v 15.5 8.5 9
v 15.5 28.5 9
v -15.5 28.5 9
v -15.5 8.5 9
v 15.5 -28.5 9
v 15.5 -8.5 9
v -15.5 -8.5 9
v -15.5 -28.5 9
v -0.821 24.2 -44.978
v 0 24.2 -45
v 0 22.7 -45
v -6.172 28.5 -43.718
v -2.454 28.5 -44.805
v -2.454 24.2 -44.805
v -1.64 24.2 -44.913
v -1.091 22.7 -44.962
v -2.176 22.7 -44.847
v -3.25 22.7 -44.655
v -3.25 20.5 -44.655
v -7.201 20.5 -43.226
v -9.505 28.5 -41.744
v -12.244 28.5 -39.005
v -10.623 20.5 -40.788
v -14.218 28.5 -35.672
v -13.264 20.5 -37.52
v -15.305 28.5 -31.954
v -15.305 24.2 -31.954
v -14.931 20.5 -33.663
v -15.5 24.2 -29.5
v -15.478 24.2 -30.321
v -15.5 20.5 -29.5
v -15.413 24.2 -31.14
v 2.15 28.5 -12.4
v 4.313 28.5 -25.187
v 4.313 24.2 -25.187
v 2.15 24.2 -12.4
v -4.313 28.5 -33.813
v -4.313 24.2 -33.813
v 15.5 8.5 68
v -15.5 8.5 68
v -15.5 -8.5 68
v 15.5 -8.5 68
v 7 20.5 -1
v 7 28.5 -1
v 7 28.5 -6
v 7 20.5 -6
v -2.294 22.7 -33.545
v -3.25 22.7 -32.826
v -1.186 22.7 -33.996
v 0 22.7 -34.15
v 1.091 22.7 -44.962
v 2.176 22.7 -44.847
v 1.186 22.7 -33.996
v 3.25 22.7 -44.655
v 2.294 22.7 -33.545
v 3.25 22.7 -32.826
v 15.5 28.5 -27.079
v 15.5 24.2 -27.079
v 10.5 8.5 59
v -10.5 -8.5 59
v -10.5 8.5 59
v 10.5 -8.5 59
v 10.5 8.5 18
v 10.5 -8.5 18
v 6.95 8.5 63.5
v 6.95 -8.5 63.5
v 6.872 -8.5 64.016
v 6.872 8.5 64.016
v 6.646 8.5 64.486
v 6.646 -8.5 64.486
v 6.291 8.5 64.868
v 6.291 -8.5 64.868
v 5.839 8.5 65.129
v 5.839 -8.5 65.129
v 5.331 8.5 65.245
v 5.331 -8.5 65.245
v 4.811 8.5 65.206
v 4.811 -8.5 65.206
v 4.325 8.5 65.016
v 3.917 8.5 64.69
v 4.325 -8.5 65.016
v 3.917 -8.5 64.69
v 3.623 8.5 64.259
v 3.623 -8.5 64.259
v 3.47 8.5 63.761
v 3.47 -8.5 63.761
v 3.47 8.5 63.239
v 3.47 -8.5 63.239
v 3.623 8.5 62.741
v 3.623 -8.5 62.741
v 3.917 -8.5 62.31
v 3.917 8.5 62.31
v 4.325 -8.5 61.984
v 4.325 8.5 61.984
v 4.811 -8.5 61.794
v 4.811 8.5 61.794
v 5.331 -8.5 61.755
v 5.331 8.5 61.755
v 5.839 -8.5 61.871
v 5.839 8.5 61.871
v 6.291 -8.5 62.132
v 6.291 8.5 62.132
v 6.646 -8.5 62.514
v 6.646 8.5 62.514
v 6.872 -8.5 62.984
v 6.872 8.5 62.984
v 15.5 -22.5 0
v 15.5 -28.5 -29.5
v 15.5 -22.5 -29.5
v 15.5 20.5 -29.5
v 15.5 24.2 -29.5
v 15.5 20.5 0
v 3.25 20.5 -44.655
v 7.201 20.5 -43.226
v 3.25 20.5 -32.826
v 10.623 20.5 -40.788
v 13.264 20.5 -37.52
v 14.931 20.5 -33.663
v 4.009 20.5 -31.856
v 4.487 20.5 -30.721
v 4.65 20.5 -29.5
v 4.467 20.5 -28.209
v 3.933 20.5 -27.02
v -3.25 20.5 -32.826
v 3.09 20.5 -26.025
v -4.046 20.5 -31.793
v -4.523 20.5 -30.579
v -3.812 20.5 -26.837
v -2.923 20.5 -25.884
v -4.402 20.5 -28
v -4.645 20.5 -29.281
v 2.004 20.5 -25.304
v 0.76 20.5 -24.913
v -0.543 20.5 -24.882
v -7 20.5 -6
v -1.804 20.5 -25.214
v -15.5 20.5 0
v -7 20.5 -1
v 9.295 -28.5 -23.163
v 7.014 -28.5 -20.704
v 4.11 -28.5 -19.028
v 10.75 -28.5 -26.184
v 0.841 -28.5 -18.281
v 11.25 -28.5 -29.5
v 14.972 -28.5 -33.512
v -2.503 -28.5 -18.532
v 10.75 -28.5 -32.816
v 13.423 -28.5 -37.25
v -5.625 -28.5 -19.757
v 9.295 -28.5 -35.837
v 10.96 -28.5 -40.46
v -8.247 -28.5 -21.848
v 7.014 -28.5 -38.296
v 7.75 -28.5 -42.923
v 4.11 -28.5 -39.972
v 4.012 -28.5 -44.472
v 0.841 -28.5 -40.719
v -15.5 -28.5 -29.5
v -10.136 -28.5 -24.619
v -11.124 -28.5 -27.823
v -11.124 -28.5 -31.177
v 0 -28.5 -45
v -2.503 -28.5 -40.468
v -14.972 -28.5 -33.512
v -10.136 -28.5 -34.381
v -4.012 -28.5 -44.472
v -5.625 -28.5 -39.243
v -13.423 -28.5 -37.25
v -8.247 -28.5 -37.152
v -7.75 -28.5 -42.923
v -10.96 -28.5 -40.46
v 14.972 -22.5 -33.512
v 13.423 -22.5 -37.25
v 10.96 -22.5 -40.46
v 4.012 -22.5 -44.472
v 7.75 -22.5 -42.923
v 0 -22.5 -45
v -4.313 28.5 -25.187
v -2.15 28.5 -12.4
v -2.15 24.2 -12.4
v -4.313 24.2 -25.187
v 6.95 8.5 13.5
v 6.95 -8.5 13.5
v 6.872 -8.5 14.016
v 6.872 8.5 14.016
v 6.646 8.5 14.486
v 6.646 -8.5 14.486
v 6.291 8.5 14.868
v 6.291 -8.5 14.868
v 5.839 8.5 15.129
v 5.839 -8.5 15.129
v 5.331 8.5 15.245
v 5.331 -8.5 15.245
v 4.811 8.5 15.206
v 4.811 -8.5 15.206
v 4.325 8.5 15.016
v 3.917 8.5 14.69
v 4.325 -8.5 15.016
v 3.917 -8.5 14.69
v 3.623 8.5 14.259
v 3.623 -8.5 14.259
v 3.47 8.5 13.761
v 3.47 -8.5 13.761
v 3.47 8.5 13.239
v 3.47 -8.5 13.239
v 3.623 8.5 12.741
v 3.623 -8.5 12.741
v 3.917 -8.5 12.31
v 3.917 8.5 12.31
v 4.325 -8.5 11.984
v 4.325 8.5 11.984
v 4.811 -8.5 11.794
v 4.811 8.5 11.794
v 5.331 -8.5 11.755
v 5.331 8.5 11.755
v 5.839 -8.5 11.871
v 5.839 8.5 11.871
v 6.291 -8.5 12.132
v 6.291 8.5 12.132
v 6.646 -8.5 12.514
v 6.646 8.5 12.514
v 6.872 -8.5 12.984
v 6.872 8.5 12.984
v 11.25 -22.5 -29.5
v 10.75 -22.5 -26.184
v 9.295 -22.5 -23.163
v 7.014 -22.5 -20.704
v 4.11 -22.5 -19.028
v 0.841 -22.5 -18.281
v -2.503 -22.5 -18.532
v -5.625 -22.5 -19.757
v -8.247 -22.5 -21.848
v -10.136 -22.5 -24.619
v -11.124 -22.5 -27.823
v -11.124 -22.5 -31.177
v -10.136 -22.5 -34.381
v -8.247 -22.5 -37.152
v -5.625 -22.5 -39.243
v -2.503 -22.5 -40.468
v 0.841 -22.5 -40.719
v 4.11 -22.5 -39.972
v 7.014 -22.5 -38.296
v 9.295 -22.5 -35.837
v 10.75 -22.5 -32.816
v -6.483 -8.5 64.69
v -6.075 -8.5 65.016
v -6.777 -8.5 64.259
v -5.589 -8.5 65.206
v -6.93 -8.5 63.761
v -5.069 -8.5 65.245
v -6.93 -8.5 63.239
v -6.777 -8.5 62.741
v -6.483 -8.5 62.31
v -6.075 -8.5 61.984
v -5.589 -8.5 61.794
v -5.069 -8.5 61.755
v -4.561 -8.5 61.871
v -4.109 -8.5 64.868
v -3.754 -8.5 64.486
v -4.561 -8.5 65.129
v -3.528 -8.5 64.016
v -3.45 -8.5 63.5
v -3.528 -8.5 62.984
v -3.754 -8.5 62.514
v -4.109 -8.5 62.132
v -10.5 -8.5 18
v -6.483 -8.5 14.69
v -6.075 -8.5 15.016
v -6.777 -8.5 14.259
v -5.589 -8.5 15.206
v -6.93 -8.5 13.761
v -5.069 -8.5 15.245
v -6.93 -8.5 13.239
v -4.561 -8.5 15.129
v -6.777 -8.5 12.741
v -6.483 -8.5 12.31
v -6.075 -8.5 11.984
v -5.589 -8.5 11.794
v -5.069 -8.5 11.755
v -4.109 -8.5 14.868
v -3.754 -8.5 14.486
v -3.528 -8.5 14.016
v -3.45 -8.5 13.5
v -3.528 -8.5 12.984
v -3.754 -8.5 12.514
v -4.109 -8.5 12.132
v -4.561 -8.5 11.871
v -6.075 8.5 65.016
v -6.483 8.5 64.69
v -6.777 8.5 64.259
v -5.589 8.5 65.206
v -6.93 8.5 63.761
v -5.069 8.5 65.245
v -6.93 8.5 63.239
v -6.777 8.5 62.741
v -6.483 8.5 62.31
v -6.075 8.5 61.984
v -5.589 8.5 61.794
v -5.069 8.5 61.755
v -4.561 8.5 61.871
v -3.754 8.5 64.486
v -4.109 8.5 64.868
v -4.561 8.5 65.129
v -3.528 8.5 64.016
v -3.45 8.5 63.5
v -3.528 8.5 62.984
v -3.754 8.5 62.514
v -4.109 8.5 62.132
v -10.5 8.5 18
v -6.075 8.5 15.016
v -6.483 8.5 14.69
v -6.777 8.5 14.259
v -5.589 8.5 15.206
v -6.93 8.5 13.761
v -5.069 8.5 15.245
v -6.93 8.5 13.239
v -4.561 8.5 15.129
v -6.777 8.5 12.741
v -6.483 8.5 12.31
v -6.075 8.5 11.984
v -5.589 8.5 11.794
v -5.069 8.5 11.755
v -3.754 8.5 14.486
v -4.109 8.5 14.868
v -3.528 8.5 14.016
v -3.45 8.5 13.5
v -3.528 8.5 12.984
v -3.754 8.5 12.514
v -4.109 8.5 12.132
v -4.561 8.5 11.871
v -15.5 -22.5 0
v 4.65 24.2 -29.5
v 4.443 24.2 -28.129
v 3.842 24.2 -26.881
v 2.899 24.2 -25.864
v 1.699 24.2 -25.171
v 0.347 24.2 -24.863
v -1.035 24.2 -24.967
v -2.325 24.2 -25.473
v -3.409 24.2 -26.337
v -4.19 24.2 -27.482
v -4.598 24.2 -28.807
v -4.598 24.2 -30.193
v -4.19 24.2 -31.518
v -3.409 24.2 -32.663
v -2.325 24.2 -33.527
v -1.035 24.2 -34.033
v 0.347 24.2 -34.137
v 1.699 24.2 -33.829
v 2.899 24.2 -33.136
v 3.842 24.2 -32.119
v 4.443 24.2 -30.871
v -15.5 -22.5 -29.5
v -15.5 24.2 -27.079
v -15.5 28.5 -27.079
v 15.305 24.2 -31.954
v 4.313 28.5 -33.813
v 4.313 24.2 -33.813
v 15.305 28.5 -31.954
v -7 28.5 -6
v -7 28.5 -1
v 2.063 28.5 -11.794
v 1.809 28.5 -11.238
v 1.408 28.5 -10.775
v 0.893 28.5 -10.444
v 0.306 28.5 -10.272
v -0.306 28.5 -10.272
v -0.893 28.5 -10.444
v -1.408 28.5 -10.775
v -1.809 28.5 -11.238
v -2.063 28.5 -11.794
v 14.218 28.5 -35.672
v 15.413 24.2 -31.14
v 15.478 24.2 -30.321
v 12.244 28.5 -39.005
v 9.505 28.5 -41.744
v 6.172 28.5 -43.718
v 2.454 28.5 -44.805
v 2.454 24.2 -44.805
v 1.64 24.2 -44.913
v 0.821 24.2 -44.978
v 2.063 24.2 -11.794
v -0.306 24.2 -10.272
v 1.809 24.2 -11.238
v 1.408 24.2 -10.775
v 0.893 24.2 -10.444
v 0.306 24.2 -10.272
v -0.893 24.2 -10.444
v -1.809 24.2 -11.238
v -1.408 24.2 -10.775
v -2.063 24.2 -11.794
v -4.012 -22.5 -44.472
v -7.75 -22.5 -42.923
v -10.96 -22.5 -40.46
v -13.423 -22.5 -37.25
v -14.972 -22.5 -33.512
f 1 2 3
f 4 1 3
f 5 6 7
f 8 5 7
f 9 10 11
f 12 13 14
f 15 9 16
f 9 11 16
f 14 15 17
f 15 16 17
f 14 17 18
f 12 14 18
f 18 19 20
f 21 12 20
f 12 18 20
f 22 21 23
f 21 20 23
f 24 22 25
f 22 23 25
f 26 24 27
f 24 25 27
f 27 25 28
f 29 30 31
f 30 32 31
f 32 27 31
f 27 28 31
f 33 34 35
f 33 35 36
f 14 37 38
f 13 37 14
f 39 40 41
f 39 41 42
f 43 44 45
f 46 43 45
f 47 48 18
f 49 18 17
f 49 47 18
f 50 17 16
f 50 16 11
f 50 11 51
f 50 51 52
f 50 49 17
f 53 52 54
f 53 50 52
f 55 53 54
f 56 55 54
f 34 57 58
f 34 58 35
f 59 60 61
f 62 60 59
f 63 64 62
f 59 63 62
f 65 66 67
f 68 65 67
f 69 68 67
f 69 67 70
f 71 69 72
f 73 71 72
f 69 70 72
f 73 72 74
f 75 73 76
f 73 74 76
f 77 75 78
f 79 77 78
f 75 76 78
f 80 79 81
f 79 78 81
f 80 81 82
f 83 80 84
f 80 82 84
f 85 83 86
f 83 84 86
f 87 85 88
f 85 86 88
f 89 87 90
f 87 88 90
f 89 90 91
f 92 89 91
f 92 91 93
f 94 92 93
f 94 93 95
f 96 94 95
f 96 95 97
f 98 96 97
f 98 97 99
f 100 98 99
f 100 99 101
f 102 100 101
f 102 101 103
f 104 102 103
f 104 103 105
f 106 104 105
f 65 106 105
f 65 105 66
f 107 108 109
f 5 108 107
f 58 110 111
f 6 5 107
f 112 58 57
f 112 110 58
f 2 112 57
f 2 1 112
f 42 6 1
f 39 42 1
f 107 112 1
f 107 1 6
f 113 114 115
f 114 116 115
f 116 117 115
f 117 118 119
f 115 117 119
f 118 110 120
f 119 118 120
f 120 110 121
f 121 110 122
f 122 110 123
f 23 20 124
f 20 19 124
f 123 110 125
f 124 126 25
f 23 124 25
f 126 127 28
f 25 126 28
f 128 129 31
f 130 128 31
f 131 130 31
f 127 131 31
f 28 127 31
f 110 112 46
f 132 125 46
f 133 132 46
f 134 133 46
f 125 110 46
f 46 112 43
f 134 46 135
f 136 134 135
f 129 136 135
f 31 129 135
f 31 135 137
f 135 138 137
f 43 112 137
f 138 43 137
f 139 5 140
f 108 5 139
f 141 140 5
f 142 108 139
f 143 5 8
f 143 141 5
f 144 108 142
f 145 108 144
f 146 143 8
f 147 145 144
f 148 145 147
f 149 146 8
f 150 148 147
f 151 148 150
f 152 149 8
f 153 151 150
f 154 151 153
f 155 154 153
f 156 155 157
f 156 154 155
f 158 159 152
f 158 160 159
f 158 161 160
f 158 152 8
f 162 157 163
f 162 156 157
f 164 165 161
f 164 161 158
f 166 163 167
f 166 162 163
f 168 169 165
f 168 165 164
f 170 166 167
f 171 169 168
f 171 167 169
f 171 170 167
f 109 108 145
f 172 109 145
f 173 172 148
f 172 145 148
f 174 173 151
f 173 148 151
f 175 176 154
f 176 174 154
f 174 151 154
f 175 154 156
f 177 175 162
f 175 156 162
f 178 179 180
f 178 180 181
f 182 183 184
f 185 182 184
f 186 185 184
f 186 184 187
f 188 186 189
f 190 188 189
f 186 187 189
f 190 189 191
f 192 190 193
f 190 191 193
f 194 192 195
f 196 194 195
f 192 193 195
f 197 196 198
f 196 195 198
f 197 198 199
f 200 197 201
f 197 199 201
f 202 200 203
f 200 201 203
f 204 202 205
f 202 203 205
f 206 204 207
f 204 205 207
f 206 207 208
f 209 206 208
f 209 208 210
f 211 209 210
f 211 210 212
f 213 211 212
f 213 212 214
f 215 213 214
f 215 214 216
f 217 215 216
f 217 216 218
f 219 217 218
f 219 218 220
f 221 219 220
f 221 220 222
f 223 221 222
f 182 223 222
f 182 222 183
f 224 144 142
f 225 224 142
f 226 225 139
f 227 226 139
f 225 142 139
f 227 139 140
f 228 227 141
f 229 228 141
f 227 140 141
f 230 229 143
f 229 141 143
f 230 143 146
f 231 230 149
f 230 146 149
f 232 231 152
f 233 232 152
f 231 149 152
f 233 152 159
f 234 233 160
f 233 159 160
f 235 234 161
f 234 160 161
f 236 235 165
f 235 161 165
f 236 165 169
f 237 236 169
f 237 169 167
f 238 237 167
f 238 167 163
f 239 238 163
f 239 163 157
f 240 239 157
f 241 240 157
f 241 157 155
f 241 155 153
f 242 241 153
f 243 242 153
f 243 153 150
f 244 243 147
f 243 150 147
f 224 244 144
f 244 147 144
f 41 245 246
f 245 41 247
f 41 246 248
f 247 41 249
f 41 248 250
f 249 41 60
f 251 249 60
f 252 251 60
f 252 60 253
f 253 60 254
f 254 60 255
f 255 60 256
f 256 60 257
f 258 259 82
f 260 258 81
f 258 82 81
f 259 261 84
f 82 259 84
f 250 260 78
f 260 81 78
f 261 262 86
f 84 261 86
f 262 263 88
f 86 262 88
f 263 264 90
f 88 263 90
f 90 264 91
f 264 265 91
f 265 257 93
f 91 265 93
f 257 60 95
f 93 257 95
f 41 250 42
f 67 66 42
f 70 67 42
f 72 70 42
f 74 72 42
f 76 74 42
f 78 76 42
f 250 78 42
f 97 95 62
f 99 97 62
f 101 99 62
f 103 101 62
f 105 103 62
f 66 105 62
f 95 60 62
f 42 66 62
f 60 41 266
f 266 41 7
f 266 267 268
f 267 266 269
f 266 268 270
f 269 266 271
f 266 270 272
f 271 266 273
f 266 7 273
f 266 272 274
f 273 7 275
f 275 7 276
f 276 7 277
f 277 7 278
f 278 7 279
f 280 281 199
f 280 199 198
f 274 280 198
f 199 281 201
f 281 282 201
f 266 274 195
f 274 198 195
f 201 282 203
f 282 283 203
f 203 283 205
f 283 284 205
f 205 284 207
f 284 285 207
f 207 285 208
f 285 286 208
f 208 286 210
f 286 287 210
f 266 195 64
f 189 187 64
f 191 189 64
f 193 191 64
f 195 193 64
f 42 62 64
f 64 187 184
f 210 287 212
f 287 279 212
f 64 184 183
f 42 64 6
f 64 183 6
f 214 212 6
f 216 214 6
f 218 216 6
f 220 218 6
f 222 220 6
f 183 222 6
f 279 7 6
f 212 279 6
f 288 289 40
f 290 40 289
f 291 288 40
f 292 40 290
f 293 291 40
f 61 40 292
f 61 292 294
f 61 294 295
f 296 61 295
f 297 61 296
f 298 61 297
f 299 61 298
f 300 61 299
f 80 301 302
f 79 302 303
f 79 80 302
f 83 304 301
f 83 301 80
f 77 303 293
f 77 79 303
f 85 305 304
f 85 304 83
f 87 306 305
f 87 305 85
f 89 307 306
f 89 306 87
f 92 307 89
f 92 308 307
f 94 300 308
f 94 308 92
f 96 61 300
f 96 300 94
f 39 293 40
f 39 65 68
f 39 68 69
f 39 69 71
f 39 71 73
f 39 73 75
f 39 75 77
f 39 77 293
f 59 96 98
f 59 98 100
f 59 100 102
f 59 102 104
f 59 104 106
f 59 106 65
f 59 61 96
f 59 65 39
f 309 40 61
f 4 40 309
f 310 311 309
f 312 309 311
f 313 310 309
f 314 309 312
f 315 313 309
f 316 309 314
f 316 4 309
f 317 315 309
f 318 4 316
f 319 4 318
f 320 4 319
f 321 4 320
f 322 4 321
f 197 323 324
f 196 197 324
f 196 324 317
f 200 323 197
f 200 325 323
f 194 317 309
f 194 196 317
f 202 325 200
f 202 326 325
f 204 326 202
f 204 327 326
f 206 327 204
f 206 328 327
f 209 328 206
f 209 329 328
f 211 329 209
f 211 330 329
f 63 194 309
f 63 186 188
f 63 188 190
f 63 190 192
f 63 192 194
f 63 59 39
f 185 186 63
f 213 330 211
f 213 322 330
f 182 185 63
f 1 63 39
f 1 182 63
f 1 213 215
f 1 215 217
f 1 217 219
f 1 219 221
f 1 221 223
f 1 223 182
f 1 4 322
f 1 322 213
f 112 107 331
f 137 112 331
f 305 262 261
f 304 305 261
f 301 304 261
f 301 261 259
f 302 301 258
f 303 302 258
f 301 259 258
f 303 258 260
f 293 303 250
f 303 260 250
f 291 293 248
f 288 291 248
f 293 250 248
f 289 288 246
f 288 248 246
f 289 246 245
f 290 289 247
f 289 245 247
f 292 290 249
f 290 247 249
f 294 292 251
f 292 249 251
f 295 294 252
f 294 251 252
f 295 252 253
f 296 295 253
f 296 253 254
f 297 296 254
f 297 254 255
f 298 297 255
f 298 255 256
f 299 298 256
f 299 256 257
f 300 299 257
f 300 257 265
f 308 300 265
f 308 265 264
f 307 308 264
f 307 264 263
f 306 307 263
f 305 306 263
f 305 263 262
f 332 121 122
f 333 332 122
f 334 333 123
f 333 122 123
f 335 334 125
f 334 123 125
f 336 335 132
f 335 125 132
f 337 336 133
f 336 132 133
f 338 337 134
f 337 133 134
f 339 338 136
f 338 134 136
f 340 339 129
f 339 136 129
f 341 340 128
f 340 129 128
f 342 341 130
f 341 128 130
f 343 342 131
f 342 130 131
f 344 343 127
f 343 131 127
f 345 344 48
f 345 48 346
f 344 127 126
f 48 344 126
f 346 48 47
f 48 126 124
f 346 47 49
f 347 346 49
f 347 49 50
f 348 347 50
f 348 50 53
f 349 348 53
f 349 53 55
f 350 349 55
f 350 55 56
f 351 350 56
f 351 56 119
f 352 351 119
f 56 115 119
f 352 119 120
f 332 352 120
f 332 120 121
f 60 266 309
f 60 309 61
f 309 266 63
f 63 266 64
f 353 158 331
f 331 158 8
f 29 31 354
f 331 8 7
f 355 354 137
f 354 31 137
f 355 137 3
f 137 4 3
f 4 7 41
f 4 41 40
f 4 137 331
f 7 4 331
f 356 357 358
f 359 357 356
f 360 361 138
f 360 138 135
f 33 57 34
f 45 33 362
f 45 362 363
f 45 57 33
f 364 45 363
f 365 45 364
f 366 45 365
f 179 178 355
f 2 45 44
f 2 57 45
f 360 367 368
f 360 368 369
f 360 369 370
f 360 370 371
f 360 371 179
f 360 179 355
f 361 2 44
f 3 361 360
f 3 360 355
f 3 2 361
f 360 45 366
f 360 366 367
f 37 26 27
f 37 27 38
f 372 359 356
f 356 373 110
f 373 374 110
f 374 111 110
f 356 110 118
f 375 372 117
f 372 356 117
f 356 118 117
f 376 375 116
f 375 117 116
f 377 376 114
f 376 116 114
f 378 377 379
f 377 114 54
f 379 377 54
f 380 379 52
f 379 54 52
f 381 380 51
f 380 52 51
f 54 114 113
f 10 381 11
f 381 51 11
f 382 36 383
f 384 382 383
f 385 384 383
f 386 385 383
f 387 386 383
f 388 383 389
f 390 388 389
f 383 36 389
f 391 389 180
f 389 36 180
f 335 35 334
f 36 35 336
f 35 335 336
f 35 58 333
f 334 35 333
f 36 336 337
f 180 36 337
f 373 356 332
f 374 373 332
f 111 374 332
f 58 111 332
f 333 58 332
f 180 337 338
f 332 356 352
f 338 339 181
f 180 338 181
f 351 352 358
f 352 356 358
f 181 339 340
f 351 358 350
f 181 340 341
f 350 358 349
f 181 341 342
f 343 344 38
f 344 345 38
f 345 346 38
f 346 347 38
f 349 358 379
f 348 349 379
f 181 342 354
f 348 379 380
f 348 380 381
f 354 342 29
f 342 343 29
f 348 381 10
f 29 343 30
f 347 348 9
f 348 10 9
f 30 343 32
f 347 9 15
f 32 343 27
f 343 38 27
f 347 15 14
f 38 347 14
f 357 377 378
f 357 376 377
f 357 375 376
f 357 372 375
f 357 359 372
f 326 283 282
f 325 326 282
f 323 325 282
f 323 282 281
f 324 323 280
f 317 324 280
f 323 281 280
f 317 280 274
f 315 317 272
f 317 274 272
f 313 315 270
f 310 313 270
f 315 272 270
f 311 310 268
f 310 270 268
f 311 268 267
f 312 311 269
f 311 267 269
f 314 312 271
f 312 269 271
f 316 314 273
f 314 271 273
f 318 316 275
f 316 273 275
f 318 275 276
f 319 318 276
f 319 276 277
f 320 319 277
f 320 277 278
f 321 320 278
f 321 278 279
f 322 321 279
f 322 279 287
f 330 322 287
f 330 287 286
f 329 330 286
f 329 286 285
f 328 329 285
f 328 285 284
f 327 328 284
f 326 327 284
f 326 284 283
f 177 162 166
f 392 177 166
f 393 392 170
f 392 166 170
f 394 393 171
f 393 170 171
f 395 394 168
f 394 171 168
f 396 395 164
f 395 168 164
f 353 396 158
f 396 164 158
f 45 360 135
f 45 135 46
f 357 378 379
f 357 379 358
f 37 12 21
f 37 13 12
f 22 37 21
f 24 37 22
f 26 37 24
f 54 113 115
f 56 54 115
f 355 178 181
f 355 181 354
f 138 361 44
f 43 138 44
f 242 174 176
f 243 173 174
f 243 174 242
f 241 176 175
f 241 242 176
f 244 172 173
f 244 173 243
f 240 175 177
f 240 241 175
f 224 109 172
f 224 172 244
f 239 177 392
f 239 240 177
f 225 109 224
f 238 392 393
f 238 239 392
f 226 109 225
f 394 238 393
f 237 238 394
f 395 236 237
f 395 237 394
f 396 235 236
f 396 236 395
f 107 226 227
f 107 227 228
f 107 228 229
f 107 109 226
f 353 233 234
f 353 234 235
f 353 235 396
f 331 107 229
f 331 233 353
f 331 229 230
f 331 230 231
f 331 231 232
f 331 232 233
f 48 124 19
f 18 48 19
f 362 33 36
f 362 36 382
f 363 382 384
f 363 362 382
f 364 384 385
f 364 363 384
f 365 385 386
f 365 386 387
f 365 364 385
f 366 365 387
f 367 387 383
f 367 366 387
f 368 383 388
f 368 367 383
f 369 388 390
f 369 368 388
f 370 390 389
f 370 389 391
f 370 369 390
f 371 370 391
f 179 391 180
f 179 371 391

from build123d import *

# Parameters (mm, degrees)
BOSS_EXTRUDE1_DEPTH = 9
SKETCH4_W           = 31
SKETCH4_H           = 8
SKETCH4_H_2         = 6
BOSS_EXTRUDE4_DEPTH = 45
CUT_EXTRUDE1_DEPTH  = 58
SKETCH6_3_R         = 11.25
CUT_EXTRUDE2_DEPTH  = 6
CUT_EXTRUDE3_DEPTH  = 4.3
CUT_EXTRUDE4_DEPTH  = 2.2
SKETCH9_3_R         = 4.65
CUT_EXTRUDE5_DEPTH  = 8
SKETCH10_W          = 31
SKETCH10_H          = 17
BOSS_EXTRUDE5_DEPTH = 59
SKETCH11_R          = 1.75
SKETCH11_W          = 21
SKETCH11_H          = 41
CUT_EXTRUDE6_DEPTH  = 38
SKETCH13_W          = 14
SKETCH13_H          = 5
CUT_EXTRUDE8_DEPTH  = 9


with BuildPart() as part:
    # Sketch1 → Boss-Extrude1 (new body)
    with BuildSketch(Plane.XY):
        Polygon((15.5, -28.5), (-15.5, -28.5), (-15.5, -10.3), (-15.5, 10.3), (-15.5, 28.5), (15.5, 28.5), align=None)
    extrude(amount=BOSS_EXTRUDE1_DEPTH)

    # Sketch4 → Boss-Extrude4 (add)
    with BuildSketch(Plane(origin=(0, 0, 0), x_dir=(-1, 0, 0), z_dir=(0, 0, -1))):
        with Locations((0, 24.5)):
            Rectangle(SKETCH4_W, SKETCH4_H)
        with Locations((0, -25.5)):
            Rectangle(SKETCH4_W, SKETCH4_H_2)
    extrude(amount=BOSS_EXTRUDE4_DEPTH)

    # Sketch6 → Cut-Extrude1 (cut, through all)
    with BuildSketch(Plane.XZ.offset(28.5)):
        with BuildLine():
            ThreePointArc((15.5, -29.5), (10.960155101, -40.460155116), (-2.1e-08, -45))
            Line((-2.1e-08, -45), (15.5, -45))
            Line((15.5, -45), (15.5, -29.5))
        make_face()
        with BuildLine():
            ThreePointArc((-2.1e-08, -45), (-10.960155116, -40.460155101), (-15.5, -29.5))
            Line((-15.5, -29.5), (-15.5, -45))
            Line((-15.5, -45), (-2.1e-08, -45))
        make_face()
    extrude(amount=-CUT_EXTRUDE1_DEPTH, mode=Mode.SUBTRACT)

    # Sketch6<3> → Cut-Extrude2 (cut)
    with BuildSketch(Plane.XZ.offset(28.5)):
        with Locations((0, -29.5)):
            Circle(SKETCH6_3_R)
    extrude(amount=-CUT_EXTRUDE2_DEPTH, mode=Mode.SUBTRACT)

    # Sketch7 → Cut-Extrude3 (cut)
    with BuildSketch(Plane(origin=(0, 28.5, 0), x_dir=(1, 0, 0), z_dir=(0, 1, 0))):
        with BuildLine():
            Line((-17.1, 31.65), (-4.313351365, 33.813351365))
            Line((-4.313351365, 33.813351365), (-2.15, 46.6))
            ThreePointArc((-2.15, 46.6), (0, 48.75), (2.15, 46.6))
            Line((2.15, 46.6), (4.313351365, 33.813351365))
            Line((4.313351365, 33.813351365), (17.1, 31.65))
            ThreePointArc((17.1, 31.65), (19.25, 29.5), (17.1, 27.35))
            Line((17.1, 27.35), (4.313351365, 25.186648635))
            Line((4.313351365, 25.186648635), (2.15, 12.4))
            ThreePointArc((2.15, 12.4), (0, 10.25), (-2.15, 12.4))
            Line((-2.15, 12.4), (-4.313351365, 25.186648635))
            Line((-4.313351365, 25.186648635), (-17.1, 27.35))
            ThreePointArc((-17.1, 27.35), (-19.25, 29.5), (-17.1, 31.65))
        make_face()
    extrude(amount=-CUT_EXTRUDE3_DEPTH, mode=Mode.SUBTRACT)

    # Sketch9 → Cut-Extrude4 (cut)
    with BuildSketch(Plane.XZ.offset(-20.5)):
        with BuildLine():
            ThreePointArc((3.25, -32.82565783), (0, -34.15), (-3.25, -32.82565783))
            Line((-3.25, -32.82565783), (-3.25, -44.655444566))
            ThreePointArc((-3.25, -44.655444566), (0, -45), (3.25, -44.655444566))
            Line((3.25, -44.655444566), (3.25, -32.82565783))
        make_face()
    extrude(amount=-CUT_EXTRUDE4_DEPTH, mode=Mode.SUBTRACT)

    # Sketch9<3> → Cut-Extrude5 (cut)
    with BuildSketch(Plane.XZ.offset(-20.5)):
        with Locations((0, -29.5)):
            Circle(SKETCH9_3_R)
    extrude(amount=-CUT_EXTRUDE5_DEPTH, mode=Mode.SUBTRACT)

    # Sketch10 → Boss-Extrude5 (add)
    with BuildSketch(Plane.XY.offset(9)):
        Rectangle(SKETCH10_W, SKETCH10_H)
    extrude(amount=BOSS_EXTRUDE5_DEPTH)

    # Sketch11 → Cut-Extrude6 (cut, through all)
    with BuildSketch(Plane.XZ.offset(8.5)):
        with Locations((5.2, 13.5)):
            Circle(SKETCH11_R)
        with Locations((-5.2, 13.5)):
            Circle(SKETCH11_R)
        with Locations((5.2, 63.5)):
            Circle(SKETCH11_R)
        with Locations((-5.2, 63.5)):
            Circle(SKETCH11_R)
        with Locations((0, 38.5)):
            Rectangle(SKETCH11_W, SKETCH11_H)
    extrude(amount=-CUT_EXTRUDE6_DEPTH, mode=Mode.SUBTRACT)

    # Sketch13 → Cut-Extrude8 (cut)
    with BuildSketch(Plane(origin=(0, 28.5, 0), x_dir=(1, 0, 0), z_dir=(0, 1, 0))):
        with Locations((0, 3.5)):
            Rectangle(SKETCH13_W, SKETCH13_H)
    extrude(amount=-CUT_EXTRUDE8_DEPTH, mode=Mode.SUBTRACT)


solid = part.part
